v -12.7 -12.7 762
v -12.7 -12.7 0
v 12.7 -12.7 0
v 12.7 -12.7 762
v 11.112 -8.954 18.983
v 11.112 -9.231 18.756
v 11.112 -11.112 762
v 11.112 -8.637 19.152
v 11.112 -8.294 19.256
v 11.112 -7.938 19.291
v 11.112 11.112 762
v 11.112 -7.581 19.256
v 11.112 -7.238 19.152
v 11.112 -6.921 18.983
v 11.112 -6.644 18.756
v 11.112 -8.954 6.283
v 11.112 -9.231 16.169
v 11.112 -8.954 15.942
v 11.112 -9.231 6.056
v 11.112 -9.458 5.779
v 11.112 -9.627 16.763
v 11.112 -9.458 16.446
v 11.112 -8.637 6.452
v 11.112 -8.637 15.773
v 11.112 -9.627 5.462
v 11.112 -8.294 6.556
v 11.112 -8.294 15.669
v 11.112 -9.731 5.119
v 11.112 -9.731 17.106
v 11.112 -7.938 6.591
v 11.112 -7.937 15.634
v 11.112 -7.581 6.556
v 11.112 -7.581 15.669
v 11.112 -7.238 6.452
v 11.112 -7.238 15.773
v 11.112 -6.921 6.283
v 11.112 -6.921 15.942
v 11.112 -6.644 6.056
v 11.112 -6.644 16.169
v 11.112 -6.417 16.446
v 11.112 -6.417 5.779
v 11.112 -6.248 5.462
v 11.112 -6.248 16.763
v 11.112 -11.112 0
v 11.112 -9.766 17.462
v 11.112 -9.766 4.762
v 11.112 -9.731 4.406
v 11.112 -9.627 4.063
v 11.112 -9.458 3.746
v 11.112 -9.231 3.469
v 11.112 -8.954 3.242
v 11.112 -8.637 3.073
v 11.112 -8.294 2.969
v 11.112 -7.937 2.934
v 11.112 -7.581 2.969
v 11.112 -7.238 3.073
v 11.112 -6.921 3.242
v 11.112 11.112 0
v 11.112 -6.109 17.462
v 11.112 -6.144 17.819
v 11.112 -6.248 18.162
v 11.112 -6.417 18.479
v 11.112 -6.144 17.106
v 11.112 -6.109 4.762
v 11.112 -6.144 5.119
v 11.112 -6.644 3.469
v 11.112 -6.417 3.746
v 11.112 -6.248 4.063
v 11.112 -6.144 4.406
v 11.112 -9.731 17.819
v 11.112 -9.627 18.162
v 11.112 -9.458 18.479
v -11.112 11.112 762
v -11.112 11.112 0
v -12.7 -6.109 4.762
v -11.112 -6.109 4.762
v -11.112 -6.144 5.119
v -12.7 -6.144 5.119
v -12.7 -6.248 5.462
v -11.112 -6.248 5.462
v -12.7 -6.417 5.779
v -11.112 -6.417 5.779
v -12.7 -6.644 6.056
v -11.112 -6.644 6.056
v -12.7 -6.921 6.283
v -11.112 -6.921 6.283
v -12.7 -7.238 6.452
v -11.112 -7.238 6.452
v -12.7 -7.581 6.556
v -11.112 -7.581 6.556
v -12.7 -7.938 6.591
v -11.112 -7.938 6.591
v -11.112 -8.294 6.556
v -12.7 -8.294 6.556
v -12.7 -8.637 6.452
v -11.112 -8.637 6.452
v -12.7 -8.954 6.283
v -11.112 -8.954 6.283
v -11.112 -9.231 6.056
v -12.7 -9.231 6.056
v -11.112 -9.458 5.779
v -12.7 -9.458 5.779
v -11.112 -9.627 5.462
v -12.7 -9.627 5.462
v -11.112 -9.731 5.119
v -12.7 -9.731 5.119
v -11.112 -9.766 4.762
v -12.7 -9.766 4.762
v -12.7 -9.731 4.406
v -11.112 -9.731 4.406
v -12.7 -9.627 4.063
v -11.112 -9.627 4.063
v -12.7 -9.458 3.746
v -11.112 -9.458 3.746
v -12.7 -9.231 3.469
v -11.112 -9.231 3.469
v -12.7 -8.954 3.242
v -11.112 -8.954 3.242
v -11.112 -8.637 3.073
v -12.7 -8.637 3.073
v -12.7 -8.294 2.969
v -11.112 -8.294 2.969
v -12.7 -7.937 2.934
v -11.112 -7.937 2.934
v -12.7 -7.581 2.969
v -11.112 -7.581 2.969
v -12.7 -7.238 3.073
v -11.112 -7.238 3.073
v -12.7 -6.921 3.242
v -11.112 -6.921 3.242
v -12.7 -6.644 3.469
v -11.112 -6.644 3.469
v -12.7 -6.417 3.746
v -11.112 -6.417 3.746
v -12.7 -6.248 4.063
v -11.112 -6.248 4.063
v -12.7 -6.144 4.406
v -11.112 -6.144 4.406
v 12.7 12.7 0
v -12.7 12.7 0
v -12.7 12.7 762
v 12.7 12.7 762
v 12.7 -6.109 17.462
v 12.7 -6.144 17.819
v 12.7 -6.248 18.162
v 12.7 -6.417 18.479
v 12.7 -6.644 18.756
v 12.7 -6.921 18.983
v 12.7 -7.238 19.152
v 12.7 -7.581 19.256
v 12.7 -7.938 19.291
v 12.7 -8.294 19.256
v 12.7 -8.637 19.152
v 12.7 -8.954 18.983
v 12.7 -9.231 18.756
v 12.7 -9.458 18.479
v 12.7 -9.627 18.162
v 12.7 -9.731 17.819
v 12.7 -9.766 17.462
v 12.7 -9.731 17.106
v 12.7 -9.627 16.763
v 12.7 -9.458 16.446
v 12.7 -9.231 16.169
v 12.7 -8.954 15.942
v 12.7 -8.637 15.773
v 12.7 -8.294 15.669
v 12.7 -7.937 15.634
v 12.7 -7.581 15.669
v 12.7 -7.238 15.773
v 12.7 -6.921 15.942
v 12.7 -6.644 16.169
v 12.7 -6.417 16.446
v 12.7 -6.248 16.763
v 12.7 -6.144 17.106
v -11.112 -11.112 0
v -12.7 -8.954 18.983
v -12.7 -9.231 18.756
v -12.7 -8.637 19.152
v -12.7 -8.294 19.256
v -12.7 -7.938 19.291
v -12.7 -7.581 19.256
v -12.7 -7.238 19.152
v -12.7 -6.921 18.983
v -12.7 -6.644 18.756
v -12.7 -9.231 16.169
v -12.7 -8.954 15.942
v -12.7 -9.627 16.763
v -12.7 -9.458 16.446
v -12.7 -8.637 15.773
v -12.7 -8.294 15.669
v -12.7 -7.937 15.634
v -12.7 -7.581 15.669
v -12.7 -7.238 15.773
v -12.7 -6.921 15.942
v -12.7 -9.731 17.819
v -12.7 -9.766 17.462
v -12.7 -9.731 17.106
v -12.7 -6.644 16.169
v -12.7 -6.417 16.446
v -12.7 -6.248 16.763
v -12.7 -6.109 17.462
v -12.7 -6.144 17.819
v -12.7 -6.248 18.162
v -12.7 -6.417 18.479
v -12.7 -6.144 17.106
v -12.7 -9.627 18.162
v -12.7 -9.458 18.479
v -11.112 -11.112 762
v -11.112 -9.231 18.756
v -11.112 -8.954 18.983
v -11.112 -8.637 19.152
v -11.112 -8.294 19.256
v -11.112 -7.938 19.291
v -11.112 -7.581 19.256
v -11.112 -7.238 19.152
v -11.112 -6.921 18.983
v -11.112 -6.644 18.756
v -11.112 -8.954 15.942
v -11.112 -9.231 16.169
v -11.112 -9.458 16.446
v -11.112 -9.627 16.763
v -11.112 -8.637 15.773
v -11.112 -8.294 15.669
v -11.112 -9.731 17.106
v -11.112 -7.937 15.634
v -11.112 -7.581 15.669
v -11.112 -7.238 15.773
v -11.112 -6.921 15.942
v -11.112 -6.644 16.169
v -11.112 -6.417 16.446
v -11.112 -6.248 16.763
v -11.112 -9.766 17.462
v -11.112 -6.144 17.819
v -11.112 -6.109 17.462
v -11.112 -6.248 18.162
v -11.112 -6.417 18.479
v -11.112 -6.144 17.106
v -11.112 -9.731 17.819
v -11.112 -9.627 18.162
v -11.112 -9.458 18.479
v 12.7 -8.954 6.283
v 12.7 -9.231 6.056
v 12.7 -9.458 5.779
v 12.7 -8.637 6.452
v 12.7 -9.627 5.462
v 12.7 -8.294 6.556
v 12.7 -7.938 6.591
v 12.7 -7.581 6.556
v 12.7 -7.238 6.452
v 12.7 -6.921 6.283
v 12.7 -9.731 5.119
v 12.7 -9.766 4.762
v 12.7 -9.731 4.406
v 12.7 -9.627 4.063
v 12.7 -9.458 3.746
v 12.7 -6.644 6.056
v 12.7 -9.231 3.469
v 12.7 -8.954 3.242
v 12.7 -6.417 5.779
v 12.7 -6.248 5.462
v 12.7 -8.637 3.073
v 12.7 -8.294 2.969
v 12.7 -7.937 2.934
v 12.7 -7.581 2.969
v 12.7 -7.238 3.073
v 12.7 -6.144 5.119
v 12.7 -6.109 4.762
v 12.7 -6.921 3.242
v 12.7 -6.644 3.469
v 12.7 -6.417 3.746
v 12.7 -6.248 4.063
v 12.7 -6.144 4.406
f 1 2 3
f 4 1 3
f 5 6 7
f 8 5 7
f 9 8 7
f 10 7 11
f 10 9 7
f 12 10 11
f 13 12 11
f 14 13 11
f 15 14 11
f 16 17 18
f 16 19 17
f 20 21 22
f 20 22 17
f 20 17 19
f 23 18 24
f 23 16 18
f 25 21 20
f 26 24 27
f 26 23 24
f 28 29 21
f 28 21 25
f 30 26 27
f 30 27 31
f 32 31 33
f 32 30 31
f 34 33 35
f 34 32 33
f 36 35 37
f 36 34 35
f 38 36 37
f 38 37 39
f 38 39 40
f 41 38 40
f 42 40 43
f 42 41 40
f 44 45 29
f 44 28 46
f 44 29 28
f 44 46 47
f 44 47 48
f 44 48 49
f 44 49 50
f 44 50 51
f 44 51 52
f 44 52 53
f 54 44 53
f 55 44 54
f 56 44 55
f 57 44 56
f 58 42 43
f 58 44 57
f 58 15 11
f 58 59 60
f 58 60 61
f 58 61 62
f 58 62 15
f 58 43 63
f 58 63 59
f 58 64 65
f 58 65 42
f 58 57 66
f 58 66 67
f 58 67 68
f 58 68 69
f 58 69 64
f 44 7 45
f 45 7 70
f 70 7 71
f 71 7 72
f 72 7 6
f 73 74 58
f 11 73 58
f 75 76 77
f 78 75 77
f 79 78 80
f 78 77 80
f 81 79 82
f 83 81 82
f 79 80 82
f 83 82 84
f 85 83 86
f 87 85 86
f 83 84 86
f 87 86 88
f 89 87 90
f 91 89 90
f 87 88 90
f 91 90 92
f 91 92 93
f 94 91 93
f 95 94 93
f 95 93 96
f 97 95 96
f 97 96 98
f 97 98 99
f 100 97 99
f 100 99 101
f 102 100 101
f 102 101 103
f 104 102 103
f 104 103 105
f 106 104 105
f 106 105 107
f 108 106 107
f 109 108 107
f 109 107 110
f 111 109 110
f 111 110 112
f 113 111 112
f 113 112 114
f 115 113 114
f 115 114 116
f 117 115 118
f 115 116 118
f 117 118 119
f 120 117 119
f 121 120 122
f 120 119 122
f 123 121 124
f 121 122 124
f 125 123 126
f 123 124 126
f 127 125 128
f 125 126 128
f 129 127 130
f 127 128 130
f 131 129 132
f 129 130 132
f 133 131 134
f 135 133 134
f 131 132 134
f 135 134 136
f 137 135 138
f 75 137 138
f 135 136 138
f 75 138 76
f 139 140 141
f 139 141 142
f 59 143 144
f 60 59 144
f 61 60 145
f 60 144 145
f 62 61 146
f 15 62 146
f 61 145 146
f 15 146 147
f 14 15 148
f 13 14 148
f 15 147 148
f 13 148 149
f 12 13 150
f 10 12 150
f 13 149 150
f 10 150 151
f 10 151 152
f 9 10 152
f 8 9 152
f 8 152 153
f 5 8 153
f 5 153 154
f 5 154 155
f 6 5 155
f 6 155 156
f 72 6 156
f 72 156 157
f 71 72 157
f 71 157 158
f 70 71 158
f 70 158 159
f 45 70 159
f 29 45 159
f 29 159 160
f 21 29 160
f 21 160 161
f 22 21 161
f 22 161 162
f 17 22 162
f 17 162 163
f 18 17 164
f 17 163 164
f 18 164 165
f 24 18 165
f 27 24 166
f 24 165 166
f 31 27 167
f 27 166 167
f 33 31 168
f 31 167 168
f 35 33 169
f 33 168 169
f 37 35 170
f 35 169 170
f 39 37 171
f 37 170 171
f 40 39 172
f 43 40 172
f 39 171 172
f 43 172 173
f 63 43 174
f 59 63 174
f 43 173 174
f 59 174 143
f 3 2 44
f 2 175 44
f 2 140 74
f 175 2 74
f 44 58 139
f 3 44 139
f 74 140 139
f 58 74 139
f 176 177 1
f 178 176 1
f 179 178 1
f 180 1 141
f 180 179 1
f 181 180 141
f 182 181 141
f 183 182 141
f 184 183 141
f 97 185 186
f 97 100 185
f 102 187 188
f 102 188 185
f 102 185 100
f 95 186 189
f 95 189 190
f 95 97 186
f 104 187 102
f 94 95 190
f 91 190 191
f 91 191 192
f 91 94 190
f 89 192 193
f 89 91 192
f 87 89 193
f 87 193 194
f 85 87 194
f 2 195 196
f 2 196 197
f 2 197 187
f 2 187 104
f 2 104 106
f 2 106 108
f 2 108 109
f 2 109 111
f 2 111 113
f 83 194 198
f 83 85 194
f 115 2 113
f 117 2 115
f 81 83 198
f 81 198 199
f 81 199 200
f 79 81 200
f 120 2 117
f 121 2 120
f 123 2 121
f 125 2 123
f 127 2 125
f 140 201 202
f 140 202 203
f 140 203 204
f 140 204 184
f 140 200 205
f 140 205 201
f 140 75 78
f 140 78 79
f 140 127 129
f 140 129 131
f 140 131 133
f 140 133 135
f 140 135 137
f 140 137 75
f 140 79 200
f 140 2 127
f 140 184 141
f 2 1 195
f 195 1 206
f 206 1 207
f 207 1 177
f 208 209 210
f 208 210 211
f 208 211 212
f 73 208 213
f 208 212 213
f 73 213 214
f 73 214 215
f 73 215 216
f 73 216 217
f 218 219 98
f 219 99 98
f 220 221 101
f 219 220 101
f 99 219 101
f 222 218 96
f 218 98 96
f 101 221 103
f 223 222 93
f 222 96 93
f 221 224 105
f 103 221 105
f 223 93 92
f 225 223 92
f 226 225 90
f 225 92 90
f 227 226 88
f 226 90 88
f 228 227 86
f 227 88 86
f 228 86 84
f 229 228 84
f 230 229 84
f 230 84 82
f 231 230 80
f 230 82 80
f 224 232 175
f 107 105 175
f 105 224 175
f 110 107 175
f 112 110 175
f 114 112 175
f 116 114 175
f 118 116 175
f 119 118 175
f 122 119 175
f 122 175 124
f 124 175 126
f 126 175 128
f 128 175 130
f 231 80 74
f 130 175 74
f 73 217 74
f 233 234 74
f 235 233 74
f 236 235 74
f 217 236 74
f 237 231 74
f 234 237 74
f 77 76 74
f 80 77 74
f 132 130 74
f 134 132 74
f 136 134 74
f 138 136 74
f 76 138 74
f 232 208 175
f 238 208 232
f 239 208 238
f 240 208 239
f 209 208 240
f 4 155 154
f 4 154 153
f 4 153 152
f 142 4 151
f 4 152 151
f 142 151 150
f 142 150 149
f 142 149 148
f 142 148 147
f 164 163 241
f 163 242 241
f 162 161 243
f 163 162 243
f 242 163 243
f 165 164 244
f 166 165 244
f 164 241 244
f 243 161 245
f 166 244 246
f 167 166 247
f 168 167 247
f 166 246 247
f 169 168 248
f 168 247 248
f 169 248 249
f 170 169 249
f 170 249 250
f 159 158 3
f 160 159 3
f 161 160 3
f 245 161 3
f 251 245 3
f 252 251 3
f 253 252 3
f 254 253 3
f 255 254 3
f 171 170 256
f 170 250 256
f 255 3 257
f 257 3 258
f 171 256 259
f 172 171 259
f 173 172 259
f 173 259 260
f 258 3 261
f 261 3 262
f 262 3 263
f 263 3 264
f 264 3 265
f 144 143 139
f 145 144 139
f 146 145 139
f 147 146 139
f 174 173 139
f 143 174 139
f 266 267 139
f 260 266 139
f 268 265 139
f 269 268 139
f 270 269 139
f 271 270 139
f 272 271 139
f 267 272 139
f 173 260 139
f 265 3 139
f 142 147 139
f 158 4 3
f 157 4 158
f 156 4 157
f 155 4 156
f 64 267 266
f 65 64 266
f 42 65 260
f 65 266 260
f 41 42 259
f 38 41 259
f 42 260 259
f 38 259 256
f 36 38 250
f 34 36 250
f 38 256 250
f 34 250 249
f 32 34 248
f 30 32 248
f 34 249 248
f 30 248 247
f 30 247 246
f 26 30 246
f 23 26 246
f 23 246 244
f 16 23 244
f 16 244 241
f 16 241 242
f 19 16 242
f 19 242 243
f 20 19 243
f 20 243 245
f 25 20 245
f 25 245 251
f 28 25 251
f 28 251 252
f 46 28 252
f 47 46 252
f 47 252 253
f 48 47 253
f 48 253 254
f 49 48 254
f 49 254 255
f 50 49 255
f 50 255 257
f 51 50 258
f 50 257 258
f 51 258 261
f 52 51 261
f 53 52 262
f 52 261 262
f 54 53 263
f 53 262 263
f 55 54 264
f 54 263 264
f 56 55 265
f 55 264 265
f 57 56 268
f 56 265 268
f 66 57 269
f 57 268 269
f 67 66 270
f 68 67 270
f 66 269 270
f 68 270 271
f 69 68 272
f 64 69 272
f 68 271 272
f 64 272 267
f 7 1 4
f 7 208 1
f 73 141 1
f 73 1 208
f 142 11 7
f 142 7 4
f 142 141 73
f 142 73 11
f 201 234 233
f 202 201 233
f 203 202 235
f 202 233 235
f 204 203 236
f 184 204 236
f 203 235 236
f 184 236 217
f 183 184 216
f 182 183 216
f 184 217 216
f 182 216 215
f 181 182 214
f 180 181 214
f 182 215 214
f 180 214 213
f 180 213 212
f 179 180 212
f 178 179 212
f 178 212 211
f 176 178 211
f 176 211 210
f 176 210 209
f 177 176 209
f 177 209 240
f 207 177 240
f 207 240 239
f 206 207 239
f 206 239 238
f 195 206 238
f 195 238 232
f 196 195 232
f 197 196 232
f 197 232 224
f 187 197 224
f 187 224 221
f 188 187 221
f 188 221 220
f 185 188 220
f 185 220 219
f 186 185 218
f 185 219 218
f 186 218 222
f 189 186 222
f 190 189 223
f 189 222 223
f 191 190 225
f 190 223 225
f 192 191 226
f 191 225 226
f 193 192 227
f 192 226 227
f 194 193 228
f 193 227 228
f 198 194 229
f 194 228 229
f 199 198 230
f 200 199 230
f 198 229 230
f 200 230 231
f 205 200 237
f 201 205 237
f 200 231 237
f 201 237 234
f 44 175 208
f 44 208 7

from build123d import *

# Parameters (mm, degrees)
F0_W     = 25.4
F0_H     = 25.4
F0_W_2   = 22.225
F0_H_2   = 22.225
F1_DEPTH = 762
F2_R     = 1.8288
F3_DEPTH = 25.4


with BuildPart() as f1:
    # F0 (on Top) → F1 (new body)
    with BuildSketch(Plane.XY):
        Rectangle(F0_W, F0_H)
        Rectangle(F0_W_2, F0_H_2, mode=Mode.SUBTRACT)
    extrude(amount=F1_DEPTH)

    # F2 (on face) → F3 (cut, through all)
    with BuildSketch(Plane.YZ.offset(12.7)):
        with Locations((-7.9375, 4.7625)):
            Circle(F2_R)
        with Locations((-7.9375, 17.4625)):
            Circle(F2_R)
    extrude(amount=-F3_DEPTH, mode=Mode.SUBTRACT)


solid = f1.part
